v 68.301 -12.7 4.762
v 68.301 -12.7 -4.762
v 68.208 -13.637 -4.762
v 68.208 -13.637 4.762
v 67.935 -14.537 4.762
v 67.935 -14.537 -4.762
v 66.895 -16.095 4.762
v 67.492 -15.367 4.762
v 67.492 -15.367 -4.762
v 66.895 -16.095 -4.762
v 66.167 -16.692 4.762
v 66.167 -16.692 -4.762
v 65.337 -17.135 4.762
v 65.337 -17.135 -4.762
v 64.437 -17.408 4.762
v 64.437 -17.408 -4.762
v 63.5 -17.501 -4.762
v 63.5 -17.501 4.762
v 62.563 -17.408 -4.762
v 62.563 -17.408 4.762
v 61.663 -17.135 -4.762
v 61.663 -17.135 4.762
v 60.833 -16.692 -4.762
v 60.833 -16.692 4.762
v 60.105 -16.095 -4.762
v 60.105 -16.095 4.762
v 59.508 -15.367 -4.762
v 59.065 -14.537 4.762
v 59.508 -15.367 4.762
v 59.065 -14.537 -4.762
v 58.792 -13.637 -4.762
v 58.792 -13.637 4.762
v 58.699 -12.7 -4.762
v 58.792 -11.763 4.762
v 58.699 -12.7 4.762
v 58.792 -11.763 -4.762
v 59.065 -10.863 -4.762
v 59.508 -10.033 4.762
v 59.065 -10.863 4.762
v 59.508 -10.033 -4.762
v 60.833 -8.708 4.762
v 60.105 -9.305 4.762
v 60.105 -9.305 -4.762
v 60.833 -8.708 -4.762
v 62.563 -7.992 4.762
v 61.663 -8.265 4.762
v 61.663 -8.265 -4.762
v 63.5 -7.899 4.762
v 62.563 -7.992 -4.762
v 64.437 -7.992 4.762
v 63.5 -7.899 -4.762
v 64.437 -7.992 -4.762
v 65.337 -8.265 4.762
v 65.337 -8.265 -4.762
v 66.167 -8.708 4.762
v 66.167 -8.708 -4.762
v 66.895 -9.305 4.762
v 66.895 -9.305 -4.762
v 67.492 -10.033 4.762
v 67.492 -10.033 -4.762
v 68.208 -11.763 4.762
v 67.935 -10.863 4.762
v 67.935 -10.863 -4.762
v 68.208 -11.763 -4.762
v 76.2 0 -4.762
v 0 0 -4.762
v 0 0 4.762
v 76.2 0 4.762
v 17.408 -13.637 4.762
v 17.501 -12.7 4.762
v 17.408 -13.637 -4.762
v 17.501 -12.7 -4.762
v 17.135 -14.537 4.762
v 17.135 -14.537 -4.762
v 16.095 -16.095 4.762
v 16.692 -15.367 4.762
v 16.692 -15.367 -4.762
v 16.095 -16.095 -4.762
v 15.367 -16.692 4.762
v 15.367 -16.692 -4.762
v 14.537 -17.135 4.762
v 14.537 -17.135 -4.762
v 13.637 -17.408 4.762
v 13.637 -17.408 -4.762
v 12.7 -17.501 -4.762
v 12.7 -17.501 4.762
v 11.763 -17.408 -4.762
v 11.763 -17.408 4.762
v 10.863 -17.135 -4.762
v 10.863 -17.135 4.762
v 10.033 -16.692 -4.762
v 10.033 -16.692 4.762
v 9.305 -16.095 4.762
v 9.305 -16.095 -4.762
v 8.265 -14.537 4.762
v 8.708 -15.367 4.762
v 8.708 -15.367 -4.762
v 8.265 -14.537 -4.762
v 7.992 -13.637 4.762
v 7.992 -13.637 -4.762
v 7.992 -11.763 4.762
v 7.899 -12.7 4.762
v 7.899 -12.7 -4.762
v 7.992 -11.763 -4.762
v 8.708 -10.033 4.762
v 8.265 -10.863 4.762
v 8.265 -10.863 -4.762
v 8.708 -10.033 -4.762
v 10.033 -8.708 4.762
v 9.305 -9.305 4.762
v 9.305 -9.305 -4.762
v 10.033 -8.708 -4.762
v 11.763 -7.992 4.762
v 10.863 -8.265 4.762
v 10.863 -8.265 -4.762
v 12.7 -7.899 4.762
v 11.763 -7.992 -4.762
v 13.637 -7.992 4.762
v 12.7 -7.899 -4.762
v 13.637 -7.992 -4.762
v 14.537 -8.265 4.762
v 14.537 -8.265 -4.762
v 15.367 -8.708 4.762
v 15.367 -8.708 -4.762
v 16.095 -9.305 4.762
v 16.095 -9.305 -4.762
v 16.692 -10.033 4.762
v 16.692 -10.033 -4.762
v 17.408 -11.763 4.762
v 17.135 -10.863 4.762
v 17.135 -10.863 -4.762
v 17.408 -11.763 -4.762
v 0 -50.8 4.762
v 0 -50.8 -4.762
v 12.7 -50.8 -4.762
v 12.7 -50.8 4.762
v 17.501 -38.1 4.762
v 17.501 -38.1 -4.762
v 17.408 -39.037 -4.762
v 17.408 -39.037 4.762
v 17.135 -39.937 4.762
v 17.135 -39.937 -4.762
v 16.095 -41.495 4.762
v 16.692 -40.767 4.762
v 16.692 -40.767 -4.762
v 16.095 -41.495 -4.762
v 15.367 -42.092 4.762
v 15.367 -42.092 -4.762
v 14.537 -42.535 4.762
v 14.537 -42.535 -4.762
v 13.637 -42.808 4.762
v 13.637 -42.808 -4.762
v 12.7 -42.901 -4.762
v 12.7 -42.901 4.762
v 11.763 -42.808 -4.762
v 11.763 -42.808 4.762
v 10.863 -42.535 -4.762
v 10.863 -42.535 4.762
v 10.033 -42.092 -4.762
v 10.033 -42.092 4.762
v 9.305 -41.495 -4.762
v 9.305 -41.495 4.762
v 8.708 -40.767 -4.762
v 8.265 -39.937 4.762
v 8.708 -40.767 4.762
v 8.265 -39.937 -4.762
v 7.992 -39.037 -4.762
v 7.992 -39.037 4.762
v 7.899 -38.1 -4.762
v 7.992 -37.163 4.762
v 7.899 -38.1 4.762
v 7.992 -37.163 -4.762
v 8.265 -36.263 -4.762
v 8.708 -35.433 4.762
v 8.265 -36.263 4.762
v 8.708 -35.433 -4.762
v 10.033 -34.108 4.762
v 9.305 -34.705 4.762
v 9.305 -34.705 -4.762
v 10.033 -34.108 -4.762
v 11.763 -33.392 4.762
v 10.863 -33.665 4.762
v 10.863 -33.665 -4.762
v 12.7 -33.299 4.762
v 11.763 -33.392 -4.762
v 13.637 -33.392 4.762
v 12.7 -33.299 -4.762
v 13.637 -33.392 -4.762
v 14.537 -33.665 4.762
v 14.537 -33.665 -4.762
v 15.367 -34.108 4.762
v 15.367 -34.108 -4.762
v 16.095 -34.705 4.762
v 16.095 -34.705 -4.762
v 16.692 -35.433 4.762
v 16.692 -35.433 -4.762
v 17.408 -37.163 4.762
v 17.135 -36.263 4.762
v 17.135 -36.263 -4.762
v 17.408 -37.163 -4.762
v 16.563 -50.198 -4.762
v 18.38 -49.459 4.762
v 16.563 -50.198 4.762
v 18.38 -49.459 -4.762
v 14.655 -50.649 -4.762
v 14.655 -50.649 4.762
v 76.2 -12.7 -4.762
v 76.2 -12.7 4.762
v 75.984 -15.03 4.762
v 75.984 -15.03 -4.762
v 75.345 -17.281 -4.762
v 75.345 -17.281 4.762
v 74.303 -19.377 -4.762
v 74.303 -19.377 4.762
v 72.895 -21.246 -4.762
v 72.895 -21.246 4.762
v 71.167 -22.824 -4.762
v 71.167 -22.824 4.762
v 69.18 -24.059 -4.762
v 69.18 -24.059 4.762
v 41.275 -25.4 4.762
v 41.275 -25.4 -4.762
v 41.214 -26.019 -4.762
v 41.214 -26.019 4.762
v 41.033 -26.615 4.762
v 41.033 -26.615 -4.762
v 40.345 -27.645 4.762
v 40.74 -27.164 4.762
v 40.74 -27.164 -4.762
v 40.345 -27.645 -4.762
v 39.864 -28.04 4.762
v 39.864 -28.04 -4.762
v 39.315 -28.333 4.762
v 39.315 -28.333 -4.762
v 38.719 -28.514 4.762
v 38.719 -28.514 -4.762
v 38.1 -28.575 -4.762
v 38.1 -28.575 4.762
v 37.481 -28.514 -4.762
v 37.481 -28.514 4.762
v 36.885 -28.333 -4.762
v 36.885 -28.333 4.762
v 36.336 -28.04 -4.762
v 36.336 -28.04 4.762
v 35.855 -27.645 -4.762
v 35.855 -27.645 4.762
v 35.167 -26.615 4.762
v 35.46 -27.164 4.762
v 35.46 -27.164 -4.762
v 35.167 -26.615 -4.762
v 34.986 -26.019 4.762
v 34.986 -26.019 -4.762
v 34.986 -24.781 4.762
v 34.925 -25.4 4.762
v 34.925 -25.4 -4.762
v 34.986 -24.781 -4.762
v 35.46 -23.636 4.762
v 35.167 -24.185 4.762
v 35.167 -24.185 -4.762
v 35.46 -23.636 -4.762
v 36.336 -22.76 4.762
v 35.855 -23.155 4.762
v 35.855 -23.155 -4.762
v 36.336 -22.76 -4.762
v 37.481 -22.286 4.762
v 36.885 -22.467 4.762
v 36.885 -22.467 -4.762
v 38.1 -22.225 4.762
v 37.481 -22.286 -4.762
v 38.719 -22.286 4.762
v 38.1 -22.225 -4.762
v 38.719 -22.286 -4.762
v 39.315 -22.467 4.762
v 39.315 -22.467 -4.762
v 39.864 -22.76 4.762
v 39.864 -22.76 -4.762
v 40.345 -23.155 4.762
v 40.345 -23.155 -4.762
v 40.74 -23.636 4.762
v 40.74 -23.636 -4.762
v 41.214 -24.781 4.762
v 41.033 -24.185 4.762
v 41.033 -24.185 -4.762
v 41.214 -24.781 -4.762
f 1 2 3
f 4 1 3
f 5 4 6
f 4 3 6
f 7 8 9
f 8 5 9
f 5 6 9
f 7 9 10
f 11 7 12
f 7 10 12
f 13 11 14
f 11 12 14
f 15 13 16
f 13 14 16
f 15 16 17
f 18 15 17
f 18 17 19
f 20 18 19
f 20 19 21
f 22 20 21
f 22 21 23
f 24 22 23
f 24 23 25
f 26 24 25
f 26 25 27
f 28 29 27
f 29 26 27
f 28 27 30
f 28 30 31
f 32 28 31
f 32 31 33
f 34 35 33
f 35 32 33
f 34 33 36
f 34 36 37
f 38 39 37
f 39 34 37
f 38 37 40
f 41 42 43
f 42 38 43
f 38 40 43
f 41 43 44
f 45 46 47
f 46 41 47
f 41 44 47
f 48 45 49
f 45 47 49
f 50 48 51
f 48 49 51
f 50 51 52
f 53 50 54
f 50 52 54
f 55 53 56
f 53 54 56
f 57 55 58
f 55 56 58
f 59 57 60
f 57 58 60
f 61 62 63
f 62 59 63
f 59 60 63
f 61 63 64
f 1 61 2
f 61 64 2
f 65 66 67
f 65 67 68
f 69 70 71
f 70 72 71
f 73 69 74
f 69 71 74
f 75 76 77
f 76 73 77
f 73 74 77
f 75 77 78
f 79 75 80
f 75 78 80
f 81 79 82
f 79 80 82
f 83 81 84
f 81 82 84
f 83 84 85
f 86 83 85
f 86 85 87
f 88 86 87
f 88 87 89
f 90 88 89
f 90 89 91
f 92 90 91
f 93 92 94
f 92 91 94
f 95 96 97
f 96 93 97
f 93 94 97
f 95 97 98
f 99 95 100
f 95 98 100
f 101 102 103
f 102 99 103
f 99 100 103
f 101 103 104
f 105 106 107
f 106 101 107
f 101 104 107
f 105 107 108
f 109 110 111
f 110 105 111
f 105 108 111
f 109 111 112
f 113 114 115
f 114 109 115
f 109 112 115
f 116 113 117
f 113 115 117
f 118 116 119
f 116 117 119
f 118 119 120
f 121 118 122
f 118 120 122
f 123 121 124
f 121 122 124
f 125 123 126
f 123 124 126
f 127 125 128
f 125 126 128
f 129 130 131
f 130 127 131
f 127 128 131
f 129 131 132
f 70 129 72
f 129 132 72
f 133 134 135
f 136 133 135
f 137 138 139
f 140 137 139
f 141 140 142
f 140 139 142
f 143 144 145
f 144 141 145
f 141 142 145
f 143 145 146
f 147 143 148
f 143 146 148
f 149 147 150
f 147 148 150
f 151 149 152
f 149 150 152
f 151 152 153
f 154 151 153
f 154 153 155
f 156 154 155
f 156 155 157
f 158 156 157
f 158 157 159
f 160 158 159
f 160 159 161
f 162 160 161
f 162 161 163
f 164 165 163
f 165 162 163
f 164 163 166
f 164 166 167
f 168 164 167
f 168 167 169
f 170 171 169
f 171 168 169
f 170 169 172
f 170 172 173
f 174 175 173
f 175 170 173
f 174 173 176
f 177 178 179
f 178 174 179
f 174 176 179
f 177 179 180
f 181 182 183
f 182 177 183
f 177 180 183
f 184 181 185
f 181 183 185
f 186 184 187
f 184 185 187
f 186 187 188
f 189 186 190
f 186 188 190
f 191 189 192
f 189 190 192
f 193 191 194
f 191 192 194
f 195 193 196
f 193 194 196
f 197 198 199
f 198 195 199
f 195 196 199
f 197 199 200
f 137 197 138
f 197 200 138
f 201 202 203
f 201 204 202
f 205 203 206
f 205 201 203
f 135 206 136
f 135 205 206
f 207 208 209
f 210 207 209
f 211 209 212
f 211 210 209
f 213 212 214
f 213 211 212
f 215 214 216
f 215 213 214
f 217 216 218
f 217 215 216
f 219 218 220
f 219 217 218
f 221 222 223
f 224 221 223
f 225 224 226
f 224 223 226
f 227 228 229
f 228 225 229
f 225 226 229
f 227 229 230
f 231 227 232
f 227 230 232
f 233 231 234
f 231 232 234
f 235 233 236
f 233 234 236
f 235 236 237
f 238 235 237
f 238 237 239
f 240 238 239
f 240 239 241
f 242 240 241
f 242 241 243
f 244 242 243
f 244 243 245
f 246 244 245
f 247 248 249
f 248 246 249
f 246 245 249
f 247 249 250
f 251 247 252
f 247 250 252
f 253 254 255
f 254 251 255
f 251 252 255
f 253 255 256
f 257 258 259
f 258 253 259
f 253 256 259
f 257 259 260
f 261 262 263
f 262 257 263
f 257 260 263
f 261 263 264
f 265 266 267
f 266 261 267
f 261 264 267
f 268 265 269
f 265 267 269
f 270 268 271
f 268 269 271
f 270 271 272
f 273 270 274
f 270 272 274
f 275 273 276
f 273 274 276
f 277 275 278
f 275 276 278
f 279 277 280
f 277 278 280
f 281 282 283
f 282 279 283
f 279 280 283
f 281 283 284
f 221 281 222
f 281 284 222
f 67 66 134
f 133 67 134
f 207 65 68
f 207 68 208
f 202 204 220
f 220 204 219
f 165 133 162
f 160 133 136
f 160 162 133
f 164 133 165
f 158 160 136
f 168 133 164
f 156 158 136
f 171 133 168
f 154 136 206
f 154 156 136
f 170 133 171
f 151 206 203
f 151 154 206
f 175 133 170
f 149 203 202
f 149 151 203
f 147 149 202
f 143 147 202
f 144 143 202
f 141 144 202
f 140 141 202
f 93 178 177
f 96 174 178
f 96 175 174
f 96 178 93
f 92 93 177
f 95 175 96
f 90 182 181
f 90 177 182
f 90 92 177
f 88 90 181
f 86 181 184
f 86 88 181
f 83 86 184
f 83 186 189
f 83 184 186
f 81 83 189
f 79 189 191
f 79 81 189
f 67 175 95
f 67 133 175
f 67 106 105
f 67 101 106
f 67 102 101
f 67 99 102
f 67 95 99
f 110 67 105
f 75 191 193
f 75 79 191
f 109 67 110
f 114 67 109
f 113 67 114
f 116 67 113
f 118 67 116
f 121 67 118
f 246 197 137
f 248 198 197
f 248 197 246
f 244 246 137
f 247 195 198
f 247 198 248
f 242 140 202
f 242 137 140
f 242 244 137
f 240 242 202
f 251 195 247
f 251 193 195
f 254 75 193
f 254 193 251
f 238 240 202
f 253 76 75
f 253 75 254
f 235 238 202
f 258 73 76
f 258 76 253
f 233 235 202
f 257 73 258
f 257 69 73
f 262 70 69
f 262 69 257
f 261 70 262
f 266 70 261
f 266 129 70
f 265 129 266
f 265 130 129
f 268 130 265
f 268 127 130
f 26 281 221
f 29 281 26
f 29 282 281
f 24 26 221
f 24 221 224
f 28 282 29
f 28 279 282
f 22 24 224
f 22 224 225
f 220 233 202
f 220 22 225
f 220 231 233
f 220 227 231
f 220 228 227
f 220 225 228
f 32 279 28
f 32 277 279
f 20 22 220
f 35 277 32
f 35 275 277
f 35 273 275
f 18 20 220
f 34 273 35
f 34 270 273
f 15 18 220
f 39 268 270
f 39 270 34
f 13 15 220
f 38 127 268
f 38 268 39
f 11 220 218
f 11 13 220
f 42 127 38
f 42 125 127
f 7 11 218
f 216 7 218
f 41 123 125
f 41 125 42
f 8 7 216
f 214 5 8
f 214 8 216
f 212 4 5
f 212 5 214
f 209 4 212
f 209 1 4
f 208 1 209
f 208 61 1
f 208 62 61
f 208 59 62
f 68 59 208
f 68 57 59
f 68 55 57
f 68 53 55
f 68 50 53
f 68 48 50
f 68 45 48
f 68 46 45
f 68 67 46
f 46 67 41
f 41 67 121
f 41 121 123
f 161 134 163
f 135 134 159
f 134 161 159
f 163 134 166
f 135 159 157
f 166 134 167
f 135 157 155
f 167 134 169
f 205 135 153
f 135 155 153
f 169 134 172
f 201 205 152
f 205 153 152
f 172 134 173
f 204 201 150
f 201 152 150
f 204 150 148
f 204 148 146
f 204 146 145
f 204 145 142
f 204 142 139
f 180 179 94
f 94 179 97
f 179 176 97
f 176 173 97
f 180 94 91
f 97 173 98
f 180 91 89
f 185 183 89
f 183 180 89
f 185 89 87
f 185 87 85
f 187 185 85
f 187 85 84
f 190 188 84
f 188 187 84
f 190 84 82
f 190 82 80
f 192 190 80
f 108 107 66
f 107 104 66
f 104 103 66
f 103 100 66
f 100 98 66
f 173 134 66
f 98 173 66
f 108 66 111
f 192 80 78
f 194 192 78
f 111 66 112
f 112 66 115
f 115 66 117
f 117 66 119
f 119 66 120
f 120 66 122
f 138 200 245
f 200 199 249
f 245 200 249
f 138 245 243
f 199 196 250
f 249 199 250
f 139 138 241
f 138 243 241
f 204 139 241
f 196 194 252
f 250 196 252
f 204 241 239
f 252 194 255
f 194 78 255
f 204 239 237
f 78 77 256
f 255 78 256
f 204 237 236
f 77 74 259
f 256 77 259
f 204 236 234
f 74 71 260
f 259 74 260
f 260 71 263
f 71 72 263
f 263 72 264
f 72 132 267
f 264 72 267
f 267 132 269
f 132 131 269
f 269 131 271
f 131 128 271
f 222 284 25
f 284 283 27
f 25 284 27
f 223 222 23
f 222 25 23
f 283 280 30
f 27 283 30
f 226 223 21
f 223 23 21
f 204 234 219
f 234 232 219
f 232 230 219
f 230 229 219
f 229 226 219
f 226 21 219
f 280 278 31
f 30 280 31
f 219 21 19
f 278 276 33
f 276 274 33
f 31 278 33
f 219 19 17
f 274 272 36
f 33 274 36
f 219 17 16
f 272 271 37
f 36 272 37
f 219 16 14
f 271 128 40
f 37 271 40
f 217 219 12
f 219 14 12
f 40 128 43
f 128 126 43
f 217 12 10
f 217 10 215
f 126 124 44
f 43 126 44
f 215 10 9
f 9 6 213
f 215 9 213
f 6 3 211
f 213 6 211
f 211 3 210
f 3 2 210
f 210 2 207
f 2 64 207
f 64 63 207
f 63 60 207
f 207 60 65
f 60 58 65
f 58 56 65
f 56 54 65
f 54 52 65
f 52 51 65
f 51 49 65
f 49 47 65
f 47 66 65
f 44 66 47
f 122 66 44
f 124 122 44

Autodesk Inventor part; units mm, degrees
ref_plane "YZ Plane" through (0, 0, 0) normal (1, 0, 0) x (0, 1, 0)
ref_plane "XZ Plane" through (0, 0, 0) normal (0, 1, 0) x (-1, 0, 0)
ref_plane "XY Plane" through (0, 0, 0) normal (0, 0, 1) x (1, 0, 0)
sketch "Sketch1" plane through (0, 0, 0) normal (0, 0, 1) x (1, 0, 0)
  line L0 (0, 0) -> (76.2, 0)
  line L1 (0, 0) -> (0, -50.8)
  line L2 (0, -50.8) -> (12.7, -50.8)
  line L3 (18.3796, -49.4592) -> (69.1796, -24.0592)
  arc A0 (12.7, -50.8) -> (18.3796, -49.4592) centre (12.7, -38.1) ccw
  line L4 (76.2, 0) -> (76.2, -12.7)
  arc A1 (69.1796, -24.0592) -> (76.2, -12.7) centre (63.5, -12.7) ccw
  circle A2 centre (12.7, -38.1) radius 4.8006
  circle A3 centre (12.7, -12.7) radius 4.8006
  circle A4 centre (63.5, -12.7) radius 4.8006
  line L5 (12.7, -12.7) -> (63.5, -12.7) construction
  line L6 (12.7, -38.1) -> (12.7, -12.7) construction
  circle A5 centre (38.1, -25.4) radius 3.175
  dimension "d2" = 50.8
  dimension "d3" = 12.7
  dimension "d4" = 12.7
  dimension "d5" = 12.7
  dimension "d7" = 9.6012
  dimension "d8" = 25.4
  dimension "d10" = 50.8
  dimension "d11" = 12.7
  dimension "d12" = 6.35
  dimension "d13" = 12.7
  dimension "d14" = 25.4
  dimension "d15" = 12.7
  dimension "d16" = 76.2
extrude "Extrusion1" add sketch "Sketch1" along normal mid plane 9.525
properties part number "Plate"
